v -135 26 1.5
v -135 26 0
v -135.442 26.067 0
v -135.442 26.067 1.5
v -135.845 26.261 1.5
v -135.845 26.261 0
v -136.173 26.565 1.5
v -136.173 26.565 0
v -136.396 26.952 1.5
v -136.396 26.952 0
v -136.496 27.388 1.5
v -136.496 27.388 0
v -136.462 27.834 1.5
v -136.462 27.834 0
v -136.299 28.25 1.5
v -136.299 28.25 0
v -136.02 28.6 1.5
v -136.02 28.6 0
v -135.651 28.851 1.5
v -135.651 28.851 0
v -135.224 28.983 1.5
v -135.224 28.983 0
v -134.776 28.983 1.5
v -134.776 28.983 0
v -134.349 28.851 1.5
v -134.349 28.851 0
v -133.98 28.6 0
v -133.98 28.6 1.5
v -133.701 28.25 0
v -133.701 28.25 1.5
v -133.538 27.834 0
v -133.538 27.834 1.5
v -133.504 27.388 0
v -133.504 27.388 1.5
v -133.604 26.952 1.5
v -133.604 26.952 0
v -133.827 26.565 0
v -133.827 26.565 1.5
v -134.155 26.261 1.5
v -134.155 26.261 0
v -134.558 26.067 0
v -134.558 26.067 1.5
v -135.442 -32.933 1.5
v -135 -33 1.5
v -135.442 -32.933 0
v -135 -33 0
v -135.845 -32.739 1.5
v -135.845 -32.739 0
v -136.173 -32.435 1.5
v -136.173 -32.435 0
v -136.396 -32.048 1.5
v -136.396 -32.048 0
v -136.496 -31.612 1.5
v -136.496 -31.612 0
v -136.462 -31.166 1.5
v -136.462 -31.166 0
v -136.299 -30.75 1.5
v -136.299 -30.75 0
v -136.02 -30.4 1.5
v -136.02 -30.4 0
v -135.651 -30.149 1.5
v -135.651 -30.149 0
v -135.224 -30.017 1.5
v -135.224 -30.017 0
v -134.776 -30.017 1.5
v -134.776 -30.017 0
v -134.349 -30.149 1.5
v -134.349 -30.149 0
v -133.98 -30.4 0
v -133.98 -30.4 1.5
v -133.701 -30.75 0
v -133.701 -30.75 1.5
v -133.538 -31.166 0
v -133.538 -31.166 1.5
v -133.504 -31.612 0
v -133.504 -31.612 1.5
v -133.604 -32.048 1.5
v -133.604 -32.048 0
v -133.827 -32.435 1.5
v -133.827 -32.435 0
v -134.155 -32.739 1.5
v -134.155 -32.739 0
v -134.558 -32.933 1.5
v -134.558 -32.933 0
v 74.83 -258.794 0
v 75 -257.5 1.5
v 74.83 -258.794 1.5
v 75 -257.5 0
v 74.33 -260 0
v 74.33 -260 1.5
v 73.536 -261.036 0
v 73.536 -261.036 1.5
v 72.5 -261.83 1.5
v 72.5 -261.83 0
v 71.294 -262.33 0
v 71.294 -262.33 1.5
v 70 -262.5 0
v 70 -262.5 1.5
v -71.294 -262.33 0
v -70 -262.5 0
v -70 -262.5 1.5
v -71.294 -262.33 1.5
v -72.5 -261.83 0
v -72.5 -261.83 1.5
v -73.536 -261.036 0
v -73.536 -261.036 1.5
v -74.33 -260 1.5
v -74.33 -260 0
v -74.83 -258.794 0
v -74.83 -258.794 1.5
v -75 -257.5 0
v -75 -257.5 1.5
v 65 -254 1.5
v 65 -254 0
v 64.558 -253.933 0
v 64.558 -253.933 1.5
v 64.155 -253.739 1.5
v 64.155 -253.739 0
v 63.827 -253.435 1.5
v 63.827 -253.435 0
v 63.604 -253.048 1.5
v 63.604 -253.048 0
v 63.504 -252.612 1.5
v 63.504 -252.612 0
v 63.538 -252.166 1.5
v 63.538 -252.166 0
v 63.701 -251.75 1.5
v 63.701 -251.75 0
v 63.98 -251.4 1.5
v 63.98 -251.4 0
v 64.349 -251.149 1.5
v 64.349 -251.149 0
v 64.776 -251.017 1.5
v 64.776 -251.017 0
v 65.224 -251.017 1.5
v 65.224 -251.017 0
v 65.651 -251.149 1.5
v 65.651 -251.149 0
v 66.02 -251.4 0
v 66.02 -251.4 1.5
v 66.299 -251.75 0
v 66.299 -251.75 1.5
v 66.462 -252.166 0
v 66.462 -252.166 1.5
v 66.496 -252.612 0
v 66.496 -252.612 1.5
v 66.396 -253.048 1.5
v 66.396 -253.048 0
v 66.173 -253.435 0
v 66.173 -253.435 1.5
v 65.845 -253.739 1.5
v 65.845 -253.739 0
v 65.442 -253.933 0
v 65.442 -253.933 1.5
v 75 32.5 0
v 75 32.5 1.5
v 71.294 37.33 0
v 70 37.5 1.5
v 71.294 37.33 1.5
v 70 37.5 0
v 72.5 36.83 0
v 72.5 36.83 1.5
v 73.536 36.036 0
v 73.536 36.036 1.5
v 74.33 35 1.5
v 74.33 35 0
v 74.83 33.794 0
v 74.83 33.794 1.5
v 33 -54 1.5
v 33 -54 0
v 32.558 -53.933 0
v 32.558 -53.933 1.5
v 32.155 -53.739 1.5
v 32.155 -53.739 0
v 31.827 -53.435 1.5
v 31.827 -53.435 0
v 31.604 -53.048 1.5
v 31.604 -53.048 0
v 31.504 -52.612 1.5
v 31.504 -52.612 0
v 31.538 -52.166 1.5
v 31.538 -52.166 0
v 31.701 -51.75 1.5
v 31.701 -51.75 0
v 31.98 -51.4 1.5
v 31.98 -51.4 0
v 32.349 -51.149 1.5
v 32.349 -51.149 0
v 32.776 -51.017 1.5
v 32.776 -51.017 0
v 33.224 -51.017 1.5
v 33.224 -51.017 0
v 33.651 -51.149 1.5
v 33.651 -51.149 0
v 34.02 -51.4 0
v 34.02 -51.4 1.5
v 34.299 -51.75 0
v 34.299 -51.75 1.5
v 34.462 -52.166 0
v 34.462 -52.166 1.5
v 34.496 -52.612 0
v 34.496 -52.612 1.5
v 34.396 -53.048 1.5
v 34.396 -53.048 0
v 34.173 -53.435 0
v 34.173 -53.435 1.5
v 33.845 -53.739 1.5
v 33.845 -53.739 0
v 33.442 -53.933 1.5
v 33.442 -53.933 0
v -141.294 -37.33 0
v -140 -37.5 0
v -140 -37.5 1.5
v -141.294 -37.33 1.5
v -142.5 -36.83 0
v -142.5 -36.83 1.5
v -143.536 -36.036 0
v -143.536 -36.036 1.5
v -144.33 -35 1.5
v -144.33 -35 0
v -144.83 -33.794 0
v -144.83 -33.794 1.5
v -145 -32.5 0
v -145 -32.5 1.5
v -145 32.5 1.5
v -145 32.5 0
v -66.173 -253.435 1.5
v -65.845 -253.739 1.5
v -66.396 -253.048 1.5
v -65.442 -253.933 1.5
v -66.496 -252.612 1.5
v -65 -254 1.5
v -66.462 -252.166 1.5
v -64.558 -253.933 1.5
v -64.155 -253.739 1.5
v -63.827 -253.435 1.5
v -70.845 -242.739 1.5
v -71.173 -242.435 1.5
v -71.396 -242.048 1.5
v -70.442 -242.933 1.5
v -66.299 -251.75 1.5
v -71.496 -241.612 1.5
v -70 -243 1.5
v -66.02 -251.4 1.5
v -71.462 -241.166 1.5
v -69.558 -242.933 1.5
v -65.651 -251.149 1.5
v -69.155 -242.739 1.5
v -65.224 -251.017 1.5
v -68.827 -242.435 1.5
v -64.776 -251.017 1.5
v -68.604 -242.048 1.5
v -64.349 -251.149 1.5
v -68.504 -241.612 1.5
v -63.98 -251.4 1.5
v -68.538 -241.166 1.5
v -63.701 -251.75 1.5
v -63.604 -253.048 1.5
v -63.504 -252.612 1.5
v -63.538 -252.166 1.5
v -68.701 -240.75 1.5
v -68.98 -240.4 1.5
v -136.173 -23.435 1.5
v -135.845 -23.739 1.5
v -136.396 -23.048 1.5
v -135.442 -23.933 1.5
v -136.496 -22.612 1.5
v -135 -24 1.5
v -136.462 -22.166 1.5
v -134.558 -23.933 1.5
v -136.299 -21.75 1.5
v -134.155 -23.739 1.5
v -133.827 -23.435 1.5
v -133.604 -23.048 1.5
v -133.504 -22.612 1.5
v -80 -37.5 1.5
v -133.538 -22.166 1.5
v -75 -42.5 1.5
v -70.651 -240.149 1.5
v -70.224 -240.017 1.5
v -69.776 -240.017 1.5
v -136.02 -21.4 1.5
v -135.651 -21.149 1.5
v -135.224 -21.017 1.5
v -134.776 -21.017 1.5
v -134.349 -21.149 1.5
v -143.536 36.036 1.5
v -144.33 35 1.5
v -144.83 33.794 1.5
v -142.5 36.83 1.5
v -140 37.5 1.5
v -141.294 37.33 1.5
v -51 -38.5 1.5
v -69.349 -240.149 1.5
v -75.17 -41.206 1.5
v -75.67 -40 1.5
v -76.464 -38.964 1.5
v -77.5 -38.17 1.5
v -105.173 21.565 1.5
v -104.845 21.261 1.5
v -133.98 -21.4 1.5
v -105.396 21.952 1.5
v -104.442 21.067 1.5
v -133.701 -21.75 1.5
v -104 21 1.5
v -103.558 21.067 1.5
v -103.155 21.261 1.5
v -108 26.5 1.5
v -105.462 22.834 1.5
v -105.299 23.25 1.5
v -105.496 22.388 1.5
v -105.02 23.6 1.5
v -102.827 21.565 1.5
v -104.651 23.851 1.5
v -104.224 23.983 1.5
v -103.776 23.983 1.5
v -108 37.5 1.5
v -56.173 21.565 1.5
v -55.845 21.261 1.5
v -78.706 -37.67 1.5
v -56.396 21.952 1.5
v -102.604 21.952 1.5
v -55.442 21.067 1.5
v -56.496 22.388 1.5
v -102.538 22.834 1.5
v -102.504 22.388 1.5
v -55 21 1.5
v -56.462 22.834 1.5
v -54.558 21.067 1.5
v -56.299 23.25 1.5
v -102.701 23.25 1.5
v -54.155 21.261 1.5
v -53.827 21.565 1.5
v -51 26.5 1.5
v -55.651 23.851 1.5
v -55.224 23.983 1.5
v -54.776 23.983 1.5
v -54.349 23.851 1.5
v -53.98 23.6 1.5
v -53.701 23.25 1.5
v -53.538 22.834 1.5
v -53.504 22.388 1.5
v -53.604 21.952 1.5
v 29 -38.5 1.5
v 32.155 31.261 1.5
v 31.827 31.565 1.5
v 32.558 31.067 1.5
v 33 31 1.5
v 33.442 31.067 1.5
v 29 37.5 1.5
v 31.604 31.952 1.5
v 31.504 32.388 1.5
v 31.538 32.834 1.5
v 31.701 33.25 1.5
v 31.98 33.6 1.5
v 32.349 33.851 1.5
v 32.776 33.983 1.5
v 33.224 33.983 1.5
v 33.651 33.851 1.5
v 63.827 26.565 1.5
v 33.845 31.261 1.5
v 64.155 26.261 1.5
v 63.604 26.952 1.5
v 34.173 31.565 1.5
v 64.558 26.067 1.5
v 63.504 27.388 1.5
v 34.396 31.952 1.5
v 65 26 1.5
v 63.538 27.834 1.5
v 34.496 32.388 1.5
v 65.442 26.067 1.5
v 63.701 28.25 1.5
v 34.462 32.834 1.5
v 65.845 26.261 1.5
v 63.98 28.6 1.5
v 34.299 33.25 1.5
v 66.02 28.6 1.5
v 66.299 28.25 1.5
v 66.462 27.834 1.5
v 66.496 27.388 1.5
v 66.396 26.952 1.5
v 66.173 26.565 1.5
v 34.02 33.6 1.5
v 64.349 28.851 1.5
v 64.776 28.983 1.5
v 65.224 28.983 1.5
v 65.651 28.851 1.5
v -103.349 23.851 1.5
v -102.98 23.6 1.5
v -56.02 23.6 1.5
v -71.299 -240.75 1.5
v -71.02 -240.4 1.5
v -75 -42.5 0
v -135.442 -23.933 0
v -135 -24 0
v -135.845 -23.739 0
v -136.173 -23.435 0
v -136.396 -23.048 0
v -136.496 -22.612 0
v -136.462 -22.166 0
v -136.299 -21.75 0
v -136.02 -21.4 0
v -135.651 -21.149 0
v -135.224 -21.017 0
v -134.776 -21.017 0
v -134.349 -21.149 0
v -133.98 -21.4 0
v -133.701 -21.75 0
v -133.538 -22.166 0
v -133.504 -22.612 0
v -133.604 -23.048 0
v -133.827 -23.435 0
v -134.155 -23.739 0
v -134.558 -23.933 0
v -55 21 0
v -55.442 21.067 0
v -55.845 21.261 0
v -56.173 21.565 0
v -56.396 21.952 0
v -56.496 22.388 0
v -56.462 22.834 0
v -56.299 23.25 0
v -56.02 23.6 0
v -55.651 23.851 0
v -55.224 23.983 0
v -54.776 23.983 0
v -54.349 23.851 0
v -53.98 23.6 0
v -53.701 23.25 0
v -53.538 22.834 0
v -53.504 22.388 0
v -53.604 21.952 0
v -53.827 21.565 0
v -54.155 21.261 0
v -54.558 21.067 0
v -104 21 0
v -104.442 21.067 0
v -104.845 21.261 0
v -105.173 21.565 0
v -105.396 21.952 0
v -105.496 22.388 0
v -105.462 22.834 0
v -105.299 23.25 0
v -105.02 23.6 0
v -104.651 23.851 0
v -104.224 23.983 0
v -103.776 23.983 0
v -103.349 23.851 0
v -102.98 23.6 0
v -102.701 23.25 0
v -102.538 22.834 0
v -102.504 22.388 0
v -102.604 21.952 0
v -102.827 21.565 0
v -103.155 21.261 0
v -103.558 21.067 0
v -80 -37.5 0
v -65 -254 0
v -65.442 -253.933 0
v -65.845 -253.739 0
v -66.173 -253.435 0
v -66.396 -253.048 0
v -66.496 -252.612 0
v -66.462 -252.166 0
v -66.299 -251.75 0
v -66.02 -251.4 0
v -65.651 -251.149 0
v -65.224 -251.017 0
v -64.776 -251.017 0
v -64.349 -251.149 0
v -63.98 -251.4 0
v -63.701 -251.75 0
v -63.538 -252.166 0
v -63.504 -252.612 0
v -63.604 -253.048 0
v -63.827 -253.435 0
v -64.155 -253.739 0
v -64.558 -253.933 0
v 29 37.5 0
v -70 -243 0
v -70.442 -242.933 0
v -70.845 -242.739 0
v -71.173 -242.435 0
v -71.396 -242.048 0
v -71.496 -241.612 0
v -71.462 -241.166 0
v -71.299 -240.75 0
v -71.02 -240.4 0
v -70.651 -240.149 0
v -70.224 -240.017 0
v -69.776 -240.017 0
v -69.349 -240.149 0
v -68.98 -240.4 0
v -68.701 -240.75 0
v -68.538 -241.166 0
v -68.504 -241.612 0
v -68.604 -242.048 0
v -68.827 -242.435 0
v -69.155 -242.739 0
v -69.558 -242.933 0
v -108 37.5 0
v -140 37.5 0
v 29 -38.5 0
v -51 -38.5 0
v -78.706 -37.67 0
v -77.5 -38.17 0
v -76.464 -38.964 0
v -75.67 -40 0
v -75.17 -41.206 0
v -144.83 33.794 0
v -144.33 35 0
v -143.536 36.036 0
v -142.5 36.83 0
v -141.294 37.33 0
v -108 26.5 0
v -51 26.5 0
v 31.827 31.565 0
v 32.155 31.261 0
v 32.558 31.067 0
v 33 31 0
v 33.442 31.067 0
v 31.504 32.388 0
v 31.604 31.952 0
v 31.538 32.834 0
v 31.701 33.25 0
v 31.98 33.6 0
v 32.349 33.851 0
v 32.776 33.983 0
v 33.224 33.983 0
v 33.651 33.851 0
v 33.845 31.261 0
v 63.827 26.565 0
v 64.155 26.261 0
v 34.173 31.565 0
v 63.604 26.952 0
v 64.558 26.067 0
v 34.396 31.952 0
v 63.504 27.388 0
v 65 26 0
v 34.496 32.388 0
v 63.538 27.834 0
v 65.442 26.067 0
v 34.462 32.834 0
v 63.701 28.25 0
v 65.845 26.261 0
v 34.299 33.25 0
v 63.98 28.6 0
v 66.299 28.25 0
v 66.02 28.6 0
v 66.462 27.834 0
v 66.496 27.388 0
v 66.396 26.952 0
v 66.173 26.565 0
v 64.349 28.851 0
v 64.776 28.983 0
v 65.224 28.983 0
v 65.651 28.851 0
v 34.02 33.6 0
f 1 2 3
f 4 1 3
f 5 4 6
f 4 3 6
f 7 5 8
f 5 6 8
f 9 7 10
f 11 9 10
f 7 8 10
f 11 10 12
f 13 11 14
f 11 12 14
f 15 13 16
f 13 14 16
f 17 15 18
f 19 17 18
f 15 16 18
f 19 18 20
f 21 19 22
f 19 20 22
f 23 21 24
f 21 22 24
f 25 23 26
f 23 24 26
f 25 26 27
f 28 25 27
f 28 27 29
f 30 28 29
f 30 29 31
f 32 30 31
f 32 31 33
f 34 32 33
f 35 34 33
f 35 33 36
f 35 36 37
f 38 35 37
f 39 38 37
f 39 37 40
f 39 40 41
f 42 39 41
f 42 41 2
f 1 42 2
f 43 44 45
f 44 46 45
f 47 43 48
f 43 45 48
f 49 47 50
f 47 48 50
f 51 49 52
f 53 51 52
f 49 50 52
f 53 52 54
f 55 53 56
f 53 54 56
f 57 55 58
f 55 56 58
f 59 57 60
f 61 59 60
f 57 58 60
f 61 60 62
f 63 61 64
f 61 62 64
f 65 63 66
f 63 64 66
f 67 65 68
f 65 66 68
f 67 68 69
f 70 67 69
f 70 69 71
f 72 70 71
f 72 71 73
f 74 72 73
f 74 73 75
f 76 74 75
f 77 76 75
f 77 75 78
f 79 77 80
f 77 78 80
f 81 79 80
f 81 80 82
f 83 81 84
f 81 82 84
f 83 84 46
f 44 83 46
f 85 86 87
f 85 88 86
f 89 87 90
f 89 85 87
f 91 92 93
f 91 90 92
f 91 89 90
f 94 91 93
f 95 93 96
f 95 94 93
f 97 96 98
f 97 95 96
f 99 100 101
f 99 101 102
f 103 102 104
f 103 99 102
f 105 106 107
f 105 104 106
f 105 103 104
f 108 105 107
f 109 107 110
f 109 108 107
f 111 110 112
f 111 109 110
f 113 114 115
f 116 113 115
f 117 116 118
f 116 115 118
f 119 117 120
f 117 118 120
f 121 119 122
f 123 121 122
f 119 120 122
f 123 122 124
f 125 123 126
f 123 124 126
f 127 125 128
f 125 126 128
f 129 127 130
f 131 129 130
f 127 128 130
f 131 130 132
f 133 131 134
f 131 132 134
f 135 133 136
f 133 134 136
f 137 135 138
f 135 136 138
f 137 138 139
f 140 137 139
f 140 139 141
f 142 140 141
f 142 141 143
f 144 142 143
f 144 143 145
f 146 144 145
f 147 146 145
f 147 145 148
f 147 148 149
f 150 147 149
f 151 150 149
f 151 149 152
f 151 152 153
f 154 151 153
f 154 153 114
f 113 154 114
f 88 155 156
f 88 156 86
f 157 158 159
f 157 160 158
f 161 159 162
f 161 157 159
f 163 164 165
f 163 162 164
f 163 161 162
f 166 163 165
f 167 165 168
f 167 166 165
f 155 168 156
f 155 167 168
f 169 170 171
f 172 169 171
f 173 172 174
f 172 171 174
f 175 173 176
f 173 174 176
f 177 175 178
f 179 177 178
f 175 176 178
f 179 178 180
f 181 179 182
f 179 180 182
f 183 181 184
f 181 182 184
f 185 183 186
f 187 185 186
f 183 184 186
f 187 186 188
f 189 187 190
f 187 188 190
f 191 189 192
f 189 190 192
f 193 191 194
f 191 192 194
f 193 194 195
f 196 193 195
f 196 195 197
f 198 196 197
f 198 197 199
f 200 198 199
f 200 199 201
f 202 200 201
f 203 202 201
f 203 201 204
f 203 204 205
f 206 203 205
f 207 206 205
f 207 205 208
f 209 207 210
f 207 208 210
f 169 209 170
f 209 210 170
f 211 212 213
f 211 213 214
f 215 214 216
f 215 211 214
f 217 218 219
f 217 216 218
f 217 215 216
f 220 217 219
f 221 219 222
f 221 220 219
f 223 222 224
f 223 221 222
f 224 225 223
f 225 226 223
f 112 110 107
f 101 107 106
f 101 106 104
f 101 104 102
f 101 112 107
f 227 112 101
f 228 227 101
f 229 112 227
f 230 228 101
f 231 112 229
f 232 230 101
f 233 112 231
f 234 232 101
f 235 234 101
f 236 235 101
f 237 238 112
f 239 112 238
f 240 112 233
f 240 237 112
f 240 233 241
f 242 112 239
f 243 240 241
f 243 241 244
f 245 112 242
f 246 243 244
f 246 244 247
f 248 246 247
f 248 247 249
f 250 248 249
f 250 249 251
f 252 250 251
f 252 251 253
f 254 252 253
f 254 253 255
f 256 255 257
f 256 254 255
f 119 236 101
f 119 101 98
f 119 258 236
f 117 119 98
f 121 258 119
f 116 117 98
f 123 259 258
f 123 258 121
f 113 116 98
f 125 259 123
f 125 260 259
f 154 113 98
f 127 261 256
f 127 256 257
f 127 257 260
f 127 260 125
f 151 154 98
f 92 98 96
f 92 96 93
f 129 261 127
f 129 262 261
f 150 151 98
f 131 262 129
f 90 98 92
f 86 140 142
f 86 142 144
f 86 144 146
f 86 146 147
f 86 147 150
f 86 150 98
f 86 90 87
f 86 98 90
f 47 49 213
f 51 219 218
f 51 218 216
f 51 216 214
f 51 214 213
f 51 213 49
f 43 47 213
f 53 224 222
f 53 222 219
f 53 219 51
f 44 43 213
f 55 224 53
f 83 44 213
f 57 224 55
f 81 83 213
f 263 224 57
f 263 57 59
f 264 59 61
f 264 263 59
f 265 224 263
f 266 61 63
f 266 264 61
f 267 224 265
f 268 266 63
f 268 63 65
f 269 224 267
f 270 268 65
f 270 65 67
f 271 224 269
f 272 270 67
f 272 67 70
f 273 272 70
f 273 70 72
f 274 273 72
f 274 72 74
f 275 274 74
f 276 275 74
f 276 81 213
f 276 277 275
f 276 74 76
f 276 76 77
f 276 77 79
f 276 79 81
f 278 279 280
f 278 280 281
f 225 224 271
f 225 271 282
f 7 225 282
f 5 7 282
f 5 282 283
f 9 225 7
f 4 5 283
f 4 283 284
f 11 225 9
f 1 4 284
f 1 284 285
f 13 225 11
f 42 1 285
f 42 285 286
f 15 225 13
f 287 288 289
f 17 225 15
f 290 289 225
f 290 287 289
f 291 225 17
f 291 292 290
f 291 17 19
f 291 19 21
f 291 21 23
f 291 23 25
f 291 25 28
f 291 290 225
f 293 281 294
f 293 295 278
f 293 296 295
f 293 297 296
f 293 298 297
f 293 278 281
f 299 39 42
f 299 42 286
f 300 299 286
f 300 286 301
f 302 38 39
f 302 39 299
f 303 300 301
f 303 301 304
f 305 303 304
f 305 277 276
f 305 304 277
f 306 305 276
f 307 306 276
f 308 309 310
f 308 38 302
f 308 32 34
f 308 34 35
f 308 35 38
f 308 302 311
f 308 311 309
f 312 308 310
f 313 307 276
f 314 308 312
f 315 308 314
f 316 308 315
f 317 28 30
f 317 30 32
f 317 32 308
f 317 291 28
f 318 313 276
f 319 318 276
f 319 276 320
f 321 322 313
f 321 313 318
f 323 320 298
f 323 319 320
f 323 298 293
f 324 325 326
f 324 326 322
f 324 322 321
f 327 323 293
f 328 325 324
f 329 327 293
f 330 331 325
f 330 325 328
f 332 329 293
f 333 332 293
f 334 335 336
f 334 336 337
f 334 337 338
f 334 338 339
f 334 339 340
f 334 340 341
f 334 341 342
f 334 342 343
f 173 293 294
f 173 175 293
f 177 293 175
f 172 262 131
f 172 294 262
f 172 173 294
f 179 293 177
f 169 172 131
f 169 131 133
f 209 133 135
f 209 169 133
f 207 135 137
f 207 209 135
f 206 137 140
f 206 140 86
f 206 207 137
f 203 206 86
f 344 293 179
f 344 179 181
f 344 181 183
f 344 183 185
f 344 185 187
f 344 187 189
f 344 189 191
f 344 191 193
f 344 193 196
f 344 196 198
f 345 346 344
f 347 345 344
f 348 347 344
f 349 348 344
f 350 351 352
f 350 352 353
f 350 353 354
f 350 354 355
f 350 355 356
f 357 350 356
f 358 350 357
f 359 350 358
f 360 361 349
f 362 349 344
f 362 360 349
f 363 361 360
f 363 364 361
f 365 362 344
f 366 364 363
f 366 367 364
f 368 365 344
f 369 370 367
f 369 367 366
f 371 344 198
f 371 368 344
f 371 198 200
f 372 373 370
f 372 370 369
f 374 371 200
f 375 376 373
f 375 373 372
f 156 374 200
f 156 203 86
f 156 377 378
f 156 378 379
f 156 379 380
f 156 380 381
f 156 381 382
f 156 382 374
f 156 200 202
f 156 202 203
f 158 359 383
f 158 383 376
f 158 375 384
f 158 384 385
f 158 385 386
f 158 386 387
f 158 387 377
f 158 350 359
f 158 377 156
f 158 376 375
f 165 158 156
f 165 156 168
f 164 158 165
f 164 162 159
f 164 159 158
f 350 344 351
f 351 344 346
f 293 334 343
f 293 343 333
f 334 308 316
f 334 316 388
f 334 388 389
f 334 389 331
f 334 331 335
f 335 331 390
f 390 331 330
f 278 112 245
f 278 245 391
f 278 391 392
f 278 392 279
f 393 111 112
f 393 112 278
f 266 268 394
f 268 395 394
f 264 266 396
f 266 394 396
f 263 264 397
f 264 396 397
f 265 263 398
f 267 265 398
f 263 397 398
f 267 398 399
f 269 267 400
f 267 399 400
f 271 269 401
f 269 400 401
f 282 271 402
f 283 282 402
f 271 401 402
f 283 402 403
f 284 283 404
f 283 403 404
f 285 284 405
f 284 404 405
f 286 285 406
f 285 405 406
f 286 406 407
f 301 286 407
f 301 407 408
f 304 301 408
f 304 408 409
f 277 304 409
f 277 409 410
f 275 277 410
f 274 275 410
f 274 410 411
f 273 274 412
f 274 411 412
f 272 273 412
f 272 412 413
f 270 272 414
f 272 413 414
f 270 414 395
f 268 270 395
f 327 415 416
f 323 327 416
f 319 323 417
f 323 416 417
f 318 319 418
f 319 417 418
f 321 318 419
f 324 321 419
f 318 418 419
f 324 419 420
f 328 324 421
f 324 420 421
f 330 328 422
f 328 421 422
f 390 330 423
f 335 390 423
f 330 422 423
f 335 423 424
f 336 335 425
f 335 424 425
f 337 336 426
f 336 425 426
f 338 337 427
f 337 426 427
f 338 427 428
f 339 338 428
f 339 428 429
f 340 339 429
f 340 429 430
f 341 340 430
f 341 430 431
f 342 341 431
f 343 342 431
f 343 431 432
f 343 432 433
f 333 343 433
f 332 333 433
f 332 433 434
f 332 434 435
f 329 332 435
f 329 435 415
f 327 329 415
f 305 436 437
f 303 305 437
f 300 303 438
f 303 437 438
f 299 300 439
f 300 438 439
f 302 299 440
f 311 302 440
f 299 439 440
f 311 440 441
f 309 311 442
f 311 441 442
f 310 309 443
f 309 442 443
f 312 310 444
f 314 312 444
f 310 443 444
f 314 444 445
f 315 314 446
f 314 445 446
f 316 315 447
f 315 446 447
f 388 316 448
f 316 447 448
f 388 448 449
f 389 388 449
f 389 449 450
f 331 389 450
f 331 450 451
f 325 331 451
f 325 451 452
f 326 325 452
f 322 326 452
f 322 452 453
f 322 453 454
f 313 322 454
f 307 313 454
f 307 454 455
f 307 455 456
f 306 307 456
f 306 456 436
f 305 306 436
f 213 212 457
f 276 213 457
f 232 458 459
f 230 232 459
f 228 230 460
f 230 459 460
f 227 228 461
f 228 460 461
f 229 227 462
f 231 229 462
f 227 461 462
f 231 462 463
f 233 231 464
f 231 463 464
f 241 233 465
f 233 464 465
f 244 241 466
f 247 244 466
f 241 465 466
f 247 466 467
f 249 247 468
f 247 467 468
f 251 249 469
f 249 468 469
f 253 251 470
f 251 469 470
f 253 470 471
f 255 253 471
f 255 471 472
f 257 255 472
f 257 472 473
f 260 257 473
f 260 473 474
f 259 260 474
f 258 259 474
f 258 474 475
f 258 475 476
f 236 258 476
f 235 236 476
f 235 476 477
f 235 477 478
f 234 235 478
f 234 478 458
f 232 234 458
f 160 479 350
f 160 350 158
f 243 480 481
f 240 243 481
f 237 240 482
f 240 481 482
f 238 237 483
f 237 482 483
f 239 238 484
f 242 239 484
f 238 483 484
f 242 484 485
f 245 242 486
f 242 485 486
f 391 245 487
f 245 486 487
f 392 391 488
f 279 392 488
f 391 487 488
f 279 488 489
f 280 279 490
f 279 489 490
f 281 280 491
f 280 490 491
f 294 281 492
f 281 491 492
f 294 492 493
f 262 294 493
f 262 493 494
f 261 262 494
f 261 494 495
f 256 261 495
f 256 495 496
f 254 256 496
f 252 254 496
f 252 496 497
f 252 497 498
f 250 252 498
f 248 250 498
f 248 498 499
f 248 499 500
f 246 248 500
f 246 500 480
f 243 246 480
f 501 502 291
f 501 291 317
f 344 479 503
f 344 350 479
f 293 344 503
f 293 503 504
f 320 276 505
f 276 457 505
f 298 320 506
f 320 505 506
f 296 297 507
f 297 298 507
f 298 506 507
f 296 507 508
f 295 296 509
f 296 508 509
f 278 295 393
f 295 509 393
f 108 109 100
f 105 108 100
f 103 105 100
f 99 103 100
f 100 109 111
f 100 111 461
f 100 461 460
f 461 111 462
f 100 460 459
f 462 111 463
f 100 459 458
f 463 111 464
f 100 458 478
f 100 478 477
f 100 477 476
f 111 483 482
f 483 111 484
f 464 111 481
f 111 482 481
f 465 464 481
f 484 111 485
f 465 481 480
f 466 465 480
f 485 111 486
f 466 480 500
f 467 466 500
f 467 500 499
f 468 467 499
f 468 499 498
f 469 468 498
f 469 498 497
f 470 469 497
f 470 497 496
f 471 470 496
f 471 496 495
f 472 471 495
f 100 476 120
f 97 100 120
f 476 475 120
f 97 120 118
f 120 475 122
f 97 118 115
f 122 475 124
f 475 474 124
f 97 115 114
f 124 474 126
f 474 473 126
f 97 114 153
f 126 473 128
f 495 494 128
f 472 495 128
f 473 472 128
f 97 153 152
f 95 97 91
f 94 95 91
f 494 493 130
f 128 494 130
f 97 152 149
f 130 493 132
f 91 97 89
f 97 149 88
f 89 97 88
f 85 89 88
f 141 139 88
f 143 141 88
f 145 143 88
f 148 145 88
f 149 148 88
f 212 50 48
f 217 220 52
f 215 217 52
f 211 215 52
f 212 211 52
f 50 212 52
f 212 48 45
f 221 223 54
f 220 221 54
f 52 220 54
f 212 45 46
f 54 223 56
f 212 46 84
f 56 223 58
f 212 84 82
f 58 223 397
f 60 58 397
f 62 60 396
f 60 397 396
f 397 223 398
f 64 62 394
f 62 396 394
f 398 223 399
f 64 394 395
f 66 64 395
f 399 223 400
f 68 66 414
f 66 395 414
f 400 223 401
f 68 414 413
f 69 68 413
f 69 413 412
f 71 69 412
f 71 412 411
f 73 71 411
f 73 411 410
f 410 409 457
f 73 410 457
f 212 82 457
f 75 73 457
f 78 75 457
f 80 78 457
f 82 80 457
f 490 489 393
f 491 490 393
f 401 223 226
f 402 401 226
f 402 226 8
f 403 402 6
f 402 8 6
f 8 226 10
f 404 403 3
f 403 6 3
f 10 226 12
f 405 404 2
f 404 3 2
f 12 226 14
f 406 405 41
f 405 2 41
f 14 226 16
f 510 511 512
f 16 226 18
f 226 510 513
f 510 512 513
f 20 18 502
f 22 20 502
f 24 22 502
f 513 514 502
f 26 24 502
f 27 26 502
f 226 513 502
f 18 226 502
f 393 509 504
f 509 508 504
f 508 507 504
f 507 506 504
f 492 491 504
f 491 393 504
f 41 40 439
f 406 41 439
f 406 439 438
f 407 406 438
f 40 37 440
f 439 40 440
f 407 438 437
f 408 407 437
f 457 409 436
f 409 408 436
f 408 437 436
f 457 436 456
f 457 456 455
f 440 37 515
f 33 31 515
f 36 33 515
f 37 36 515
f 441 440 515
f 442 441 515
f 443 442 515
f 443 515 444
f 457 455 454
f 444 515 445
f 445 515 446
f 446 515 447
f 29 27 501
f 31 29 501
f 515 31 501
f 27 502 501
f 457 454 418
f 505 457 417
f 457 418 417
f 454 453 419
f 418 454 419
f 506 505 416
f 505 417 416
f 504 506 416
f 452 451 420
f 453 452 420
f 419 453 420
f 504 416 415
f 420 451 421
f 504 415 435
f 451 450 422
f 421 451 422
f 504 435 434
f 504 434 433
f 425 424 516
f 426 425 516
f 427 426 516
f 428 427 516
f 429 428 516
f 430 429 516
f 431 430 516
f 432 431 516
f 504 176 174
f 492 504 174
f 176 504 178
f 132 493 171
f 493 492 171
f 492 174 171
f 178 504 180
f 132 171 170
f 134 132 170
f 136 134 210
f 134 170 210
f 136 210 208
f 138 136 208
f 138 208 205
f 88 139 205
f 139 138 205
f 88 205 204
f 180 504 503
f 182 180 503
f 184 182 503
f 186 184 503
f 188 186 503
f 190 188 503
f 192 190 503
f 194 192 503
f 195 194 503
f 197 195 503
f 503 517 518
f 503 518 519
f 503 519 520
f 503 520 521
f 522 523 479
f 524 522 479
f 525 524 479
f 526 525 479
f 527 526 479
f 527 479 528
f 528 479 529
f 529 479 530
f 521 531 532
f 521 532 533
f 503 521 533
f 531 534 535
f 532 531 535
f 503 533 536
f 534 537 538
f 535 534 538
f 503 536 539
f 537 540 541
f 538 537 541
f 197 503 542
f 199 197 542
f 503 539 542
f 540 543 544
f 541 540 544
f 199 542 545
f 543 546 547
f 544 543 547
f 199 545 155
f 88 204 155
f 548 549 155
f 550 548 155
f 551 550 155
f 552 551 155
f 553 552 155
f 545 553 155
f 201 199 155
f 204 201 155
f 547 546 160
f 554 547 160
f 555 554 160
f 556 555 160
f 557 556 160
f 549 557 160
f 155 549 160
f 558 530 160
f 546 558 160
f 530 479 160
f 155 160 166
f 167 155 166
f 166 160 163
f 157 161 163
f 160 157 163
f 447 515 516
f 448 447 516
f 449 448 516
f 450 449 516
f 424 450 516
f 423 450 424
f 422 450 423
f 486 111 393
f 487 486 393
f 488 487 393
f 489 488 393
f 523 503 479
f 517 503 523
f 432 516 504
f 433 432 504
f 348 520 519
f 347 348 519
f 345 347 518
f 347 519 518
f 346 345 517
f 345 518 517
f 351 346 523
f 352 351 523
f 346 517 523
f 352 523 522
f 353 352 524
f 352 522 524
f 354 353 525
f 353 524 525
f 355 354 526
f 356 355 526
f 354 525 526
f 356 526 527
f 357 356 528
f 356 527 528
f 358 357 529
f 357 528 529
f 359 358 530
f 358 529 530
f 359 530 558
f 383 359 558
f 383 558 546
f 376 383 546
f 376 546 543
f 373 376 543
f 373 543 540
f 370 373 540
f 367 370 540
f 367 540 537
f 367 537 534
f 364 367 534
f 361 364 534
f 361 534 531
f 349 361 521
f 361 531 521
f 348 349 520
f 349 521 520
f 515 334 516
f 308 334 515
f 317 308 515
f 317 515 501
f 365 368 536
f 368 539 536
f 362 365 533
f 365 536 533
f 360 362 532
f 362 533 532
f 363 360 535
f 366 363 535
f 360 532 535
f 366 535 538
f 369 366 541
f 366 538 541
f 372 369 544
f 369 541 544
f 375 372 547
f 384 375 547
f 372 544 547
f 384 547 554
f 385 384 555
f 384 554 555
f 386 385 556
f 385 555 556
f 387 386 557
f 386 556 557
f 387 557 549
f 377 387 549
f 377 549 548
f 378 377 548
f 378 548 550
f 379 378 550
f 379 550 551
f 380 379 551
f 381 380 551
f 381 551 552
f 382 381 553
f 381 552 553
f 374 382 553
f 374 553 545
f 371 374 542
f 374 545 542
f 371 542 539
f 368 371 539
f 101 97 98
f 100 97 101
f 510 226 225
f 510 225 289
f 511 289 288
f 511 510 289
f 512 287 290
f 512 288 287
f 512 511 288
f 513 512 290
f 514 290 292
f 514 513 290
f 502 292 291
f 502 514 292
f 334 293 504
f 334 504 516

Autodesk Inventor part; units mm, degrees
ref_plane "YZ Plane" through (0, 0, 0) normal (1, 0, 0) x (0, 1, 0)
ref_plane "XZ Plane" through (0, 0, 0) normal (0, 1, 0) x (-1, 0, 0)
ref_plane "XY Plane" through (0, 0, 0) normal (0, 0, 1) x (1, 0, 0)
sketch "スケッチ2" plane through (0, 0, 0) normal (0, 0, 1) x (1, 0, 0)
  line L0 (-70, 37.5) -> (70, 37.5)
  line L1 (75, 32.5) -> (75, -257.5)
  line L2 (70, -262.5) -> (-70, -262.5)
  line L3 (-75, -183.2657) -> (-75, -42.5)
  arc A0 (75, 32.5) -> (70, 37.5) centre (70, 32.5) ccw
  arc A1 (70, -262.5) -> (75, -257.5) centre (70, -257.5) ccw
  line L4 (-75, -257.5) -> (-75, -183.1423)
  arc A2 (-75, -257.5) -> (-70, -262.5) centre (-70, -257.5) ccw
  line L5 (-70, 37.5) -> (-140, 37.5)
  line L6 (-145, 32.5) -> (-145, -32.5)
  line L7 (-140, -37.5) -> (-80, -37.5)
  arc A3 (-140, 37.5) -> (-145, 32.5) centre (-140, 32.5) ccw
  arc A4 (-145, -32.5) -> (-140, -37.5) centre (-140, -32.5) ccw
  arc A5 (-75, -42.5) -> (-80, -37.5) centre (-80, -42.5) ccw
  point P0 (0, 0)
  point P1 (-75, 37.5)
  point P2 (75, -262.5)
  point P3 (75, 37.5)
  point P4 (-75, -262.5)
  point P5 (-75, 0)
  point P6 (0, 37.5)
  point P7 (0, 0)
  point P8 (-145, 0)
  dimension "d1" = 300
  dimension "d24" = 5
  dimension "d49" = 220
  dimension "d50" = 5
  dimension "d51" = 75
extrude "押し出し1" add sketch "スケッチ2" along normal blind 1.5
sketch "スケッチ5" plane through (0, 0, 1.5) normal (0, 0, 1) x (1, 0, 0)
  line L0 (70, 37.5) -> (-140, 37.5) projected
  line L1 (75, -257.5) -> (75, 32.5) projected
  line L2 (-70, -262.5) -> (70, -262.5) projected
  line L3 (-145, 32.5) -> (-145, -32.5) projected
  line L4 (-140, -37.5) -> (-80, -37.5) projected
  line L5 (-75, -42.5) -> (-75, -257.5) projected
  point P0 (-135, 27.5)
  point P1 (65, 27.5)
  point P2 (65, -252.5)
  point P3 (-70, 37.5)
  point P4 (-135, -31.5)
  point P5 (-70, -241.5)
  point P6 (33, -52.5)
  point P7 (33, 32.5)
  point P8 (-55, 22.5)
  point P9 (-135, -22.5)
  point P10 (-65, -252.5)
  point P11 (-104, 22.5)
  dimension "d25" = 10
  dimension "d27" = 10
  dimension "d44" = 80
  dimension "d46" = 85
  dimension "d52" = 10
  dimension "d55" = 10
  dimension "d56" = 10
  dimension "d58" = 21
  dimension "d59" = 5
  dimension "d60" = 15
  dimension "d61" = 69
  dimension "d62" = 5
  dimension "d66" = 54
  dimension "d67" = 49
hole "穴3" at (-135, 27.5, 1.5) at (65, 27.5, 1.5) at (65, -252.5, 1.5) at (-135, -31.5, 1.5) at (-70, -241.5, 1.5) at (-55, 22.5, 1.5) at (33, 32.5, 1.5) at (33, -52.5, 1.5) at (-135, -22.5, 1.5) at (-65, -252.5, 1.5) at (-104, 22.5, 1.5) direction (0, 0, -1) diameter 3 depth 8.1 tip angle 118
sketch "スケッチ6" plane through (0, 0, 1.5) normal (0, 0, 1) x (1, 0, 0)
  point P0 (0, 0)
sketch "スケッチ7" plane through (0, 0, 1.5) normal (0, 0, 1) x (1, 0, 0)
  line L0 (-51, 26.5) -> (-108, 26.5)
  line L1 (-108, 26.5) -> (-108, 37.5)
  line L2 (-108, 37.5) -> (29, 37.5)
  line L3 (29, 37.5) -> (29, -38.5)
  line L4 (-51, 0) -> (-51, 26.5)
  circle A0 centre (-55, 22.5) radius 1.5 projected
  circle A1 centre (-104, 22.5) radius 1.5 projected
  line L5 (70, 37.5) -> (-140, 37.5) projected
  line L6 (29, -38.5) -> (-51, -38.5)
  line L7 (-51, -38.5) -> (-51, 0)
  point P0 (-25.5, 0)
  dimension "d68" = 4
  dimension "d69" = 4
  dimension "d70" = 4
  dimension "d74" = 76
  dimension "d75" = 80
extrude "押し出し2" cut sketch "スケッチ7" against normal blind 10 contours L0 L1 L2 L3 L6 L7 L4
properties part number "天板"
